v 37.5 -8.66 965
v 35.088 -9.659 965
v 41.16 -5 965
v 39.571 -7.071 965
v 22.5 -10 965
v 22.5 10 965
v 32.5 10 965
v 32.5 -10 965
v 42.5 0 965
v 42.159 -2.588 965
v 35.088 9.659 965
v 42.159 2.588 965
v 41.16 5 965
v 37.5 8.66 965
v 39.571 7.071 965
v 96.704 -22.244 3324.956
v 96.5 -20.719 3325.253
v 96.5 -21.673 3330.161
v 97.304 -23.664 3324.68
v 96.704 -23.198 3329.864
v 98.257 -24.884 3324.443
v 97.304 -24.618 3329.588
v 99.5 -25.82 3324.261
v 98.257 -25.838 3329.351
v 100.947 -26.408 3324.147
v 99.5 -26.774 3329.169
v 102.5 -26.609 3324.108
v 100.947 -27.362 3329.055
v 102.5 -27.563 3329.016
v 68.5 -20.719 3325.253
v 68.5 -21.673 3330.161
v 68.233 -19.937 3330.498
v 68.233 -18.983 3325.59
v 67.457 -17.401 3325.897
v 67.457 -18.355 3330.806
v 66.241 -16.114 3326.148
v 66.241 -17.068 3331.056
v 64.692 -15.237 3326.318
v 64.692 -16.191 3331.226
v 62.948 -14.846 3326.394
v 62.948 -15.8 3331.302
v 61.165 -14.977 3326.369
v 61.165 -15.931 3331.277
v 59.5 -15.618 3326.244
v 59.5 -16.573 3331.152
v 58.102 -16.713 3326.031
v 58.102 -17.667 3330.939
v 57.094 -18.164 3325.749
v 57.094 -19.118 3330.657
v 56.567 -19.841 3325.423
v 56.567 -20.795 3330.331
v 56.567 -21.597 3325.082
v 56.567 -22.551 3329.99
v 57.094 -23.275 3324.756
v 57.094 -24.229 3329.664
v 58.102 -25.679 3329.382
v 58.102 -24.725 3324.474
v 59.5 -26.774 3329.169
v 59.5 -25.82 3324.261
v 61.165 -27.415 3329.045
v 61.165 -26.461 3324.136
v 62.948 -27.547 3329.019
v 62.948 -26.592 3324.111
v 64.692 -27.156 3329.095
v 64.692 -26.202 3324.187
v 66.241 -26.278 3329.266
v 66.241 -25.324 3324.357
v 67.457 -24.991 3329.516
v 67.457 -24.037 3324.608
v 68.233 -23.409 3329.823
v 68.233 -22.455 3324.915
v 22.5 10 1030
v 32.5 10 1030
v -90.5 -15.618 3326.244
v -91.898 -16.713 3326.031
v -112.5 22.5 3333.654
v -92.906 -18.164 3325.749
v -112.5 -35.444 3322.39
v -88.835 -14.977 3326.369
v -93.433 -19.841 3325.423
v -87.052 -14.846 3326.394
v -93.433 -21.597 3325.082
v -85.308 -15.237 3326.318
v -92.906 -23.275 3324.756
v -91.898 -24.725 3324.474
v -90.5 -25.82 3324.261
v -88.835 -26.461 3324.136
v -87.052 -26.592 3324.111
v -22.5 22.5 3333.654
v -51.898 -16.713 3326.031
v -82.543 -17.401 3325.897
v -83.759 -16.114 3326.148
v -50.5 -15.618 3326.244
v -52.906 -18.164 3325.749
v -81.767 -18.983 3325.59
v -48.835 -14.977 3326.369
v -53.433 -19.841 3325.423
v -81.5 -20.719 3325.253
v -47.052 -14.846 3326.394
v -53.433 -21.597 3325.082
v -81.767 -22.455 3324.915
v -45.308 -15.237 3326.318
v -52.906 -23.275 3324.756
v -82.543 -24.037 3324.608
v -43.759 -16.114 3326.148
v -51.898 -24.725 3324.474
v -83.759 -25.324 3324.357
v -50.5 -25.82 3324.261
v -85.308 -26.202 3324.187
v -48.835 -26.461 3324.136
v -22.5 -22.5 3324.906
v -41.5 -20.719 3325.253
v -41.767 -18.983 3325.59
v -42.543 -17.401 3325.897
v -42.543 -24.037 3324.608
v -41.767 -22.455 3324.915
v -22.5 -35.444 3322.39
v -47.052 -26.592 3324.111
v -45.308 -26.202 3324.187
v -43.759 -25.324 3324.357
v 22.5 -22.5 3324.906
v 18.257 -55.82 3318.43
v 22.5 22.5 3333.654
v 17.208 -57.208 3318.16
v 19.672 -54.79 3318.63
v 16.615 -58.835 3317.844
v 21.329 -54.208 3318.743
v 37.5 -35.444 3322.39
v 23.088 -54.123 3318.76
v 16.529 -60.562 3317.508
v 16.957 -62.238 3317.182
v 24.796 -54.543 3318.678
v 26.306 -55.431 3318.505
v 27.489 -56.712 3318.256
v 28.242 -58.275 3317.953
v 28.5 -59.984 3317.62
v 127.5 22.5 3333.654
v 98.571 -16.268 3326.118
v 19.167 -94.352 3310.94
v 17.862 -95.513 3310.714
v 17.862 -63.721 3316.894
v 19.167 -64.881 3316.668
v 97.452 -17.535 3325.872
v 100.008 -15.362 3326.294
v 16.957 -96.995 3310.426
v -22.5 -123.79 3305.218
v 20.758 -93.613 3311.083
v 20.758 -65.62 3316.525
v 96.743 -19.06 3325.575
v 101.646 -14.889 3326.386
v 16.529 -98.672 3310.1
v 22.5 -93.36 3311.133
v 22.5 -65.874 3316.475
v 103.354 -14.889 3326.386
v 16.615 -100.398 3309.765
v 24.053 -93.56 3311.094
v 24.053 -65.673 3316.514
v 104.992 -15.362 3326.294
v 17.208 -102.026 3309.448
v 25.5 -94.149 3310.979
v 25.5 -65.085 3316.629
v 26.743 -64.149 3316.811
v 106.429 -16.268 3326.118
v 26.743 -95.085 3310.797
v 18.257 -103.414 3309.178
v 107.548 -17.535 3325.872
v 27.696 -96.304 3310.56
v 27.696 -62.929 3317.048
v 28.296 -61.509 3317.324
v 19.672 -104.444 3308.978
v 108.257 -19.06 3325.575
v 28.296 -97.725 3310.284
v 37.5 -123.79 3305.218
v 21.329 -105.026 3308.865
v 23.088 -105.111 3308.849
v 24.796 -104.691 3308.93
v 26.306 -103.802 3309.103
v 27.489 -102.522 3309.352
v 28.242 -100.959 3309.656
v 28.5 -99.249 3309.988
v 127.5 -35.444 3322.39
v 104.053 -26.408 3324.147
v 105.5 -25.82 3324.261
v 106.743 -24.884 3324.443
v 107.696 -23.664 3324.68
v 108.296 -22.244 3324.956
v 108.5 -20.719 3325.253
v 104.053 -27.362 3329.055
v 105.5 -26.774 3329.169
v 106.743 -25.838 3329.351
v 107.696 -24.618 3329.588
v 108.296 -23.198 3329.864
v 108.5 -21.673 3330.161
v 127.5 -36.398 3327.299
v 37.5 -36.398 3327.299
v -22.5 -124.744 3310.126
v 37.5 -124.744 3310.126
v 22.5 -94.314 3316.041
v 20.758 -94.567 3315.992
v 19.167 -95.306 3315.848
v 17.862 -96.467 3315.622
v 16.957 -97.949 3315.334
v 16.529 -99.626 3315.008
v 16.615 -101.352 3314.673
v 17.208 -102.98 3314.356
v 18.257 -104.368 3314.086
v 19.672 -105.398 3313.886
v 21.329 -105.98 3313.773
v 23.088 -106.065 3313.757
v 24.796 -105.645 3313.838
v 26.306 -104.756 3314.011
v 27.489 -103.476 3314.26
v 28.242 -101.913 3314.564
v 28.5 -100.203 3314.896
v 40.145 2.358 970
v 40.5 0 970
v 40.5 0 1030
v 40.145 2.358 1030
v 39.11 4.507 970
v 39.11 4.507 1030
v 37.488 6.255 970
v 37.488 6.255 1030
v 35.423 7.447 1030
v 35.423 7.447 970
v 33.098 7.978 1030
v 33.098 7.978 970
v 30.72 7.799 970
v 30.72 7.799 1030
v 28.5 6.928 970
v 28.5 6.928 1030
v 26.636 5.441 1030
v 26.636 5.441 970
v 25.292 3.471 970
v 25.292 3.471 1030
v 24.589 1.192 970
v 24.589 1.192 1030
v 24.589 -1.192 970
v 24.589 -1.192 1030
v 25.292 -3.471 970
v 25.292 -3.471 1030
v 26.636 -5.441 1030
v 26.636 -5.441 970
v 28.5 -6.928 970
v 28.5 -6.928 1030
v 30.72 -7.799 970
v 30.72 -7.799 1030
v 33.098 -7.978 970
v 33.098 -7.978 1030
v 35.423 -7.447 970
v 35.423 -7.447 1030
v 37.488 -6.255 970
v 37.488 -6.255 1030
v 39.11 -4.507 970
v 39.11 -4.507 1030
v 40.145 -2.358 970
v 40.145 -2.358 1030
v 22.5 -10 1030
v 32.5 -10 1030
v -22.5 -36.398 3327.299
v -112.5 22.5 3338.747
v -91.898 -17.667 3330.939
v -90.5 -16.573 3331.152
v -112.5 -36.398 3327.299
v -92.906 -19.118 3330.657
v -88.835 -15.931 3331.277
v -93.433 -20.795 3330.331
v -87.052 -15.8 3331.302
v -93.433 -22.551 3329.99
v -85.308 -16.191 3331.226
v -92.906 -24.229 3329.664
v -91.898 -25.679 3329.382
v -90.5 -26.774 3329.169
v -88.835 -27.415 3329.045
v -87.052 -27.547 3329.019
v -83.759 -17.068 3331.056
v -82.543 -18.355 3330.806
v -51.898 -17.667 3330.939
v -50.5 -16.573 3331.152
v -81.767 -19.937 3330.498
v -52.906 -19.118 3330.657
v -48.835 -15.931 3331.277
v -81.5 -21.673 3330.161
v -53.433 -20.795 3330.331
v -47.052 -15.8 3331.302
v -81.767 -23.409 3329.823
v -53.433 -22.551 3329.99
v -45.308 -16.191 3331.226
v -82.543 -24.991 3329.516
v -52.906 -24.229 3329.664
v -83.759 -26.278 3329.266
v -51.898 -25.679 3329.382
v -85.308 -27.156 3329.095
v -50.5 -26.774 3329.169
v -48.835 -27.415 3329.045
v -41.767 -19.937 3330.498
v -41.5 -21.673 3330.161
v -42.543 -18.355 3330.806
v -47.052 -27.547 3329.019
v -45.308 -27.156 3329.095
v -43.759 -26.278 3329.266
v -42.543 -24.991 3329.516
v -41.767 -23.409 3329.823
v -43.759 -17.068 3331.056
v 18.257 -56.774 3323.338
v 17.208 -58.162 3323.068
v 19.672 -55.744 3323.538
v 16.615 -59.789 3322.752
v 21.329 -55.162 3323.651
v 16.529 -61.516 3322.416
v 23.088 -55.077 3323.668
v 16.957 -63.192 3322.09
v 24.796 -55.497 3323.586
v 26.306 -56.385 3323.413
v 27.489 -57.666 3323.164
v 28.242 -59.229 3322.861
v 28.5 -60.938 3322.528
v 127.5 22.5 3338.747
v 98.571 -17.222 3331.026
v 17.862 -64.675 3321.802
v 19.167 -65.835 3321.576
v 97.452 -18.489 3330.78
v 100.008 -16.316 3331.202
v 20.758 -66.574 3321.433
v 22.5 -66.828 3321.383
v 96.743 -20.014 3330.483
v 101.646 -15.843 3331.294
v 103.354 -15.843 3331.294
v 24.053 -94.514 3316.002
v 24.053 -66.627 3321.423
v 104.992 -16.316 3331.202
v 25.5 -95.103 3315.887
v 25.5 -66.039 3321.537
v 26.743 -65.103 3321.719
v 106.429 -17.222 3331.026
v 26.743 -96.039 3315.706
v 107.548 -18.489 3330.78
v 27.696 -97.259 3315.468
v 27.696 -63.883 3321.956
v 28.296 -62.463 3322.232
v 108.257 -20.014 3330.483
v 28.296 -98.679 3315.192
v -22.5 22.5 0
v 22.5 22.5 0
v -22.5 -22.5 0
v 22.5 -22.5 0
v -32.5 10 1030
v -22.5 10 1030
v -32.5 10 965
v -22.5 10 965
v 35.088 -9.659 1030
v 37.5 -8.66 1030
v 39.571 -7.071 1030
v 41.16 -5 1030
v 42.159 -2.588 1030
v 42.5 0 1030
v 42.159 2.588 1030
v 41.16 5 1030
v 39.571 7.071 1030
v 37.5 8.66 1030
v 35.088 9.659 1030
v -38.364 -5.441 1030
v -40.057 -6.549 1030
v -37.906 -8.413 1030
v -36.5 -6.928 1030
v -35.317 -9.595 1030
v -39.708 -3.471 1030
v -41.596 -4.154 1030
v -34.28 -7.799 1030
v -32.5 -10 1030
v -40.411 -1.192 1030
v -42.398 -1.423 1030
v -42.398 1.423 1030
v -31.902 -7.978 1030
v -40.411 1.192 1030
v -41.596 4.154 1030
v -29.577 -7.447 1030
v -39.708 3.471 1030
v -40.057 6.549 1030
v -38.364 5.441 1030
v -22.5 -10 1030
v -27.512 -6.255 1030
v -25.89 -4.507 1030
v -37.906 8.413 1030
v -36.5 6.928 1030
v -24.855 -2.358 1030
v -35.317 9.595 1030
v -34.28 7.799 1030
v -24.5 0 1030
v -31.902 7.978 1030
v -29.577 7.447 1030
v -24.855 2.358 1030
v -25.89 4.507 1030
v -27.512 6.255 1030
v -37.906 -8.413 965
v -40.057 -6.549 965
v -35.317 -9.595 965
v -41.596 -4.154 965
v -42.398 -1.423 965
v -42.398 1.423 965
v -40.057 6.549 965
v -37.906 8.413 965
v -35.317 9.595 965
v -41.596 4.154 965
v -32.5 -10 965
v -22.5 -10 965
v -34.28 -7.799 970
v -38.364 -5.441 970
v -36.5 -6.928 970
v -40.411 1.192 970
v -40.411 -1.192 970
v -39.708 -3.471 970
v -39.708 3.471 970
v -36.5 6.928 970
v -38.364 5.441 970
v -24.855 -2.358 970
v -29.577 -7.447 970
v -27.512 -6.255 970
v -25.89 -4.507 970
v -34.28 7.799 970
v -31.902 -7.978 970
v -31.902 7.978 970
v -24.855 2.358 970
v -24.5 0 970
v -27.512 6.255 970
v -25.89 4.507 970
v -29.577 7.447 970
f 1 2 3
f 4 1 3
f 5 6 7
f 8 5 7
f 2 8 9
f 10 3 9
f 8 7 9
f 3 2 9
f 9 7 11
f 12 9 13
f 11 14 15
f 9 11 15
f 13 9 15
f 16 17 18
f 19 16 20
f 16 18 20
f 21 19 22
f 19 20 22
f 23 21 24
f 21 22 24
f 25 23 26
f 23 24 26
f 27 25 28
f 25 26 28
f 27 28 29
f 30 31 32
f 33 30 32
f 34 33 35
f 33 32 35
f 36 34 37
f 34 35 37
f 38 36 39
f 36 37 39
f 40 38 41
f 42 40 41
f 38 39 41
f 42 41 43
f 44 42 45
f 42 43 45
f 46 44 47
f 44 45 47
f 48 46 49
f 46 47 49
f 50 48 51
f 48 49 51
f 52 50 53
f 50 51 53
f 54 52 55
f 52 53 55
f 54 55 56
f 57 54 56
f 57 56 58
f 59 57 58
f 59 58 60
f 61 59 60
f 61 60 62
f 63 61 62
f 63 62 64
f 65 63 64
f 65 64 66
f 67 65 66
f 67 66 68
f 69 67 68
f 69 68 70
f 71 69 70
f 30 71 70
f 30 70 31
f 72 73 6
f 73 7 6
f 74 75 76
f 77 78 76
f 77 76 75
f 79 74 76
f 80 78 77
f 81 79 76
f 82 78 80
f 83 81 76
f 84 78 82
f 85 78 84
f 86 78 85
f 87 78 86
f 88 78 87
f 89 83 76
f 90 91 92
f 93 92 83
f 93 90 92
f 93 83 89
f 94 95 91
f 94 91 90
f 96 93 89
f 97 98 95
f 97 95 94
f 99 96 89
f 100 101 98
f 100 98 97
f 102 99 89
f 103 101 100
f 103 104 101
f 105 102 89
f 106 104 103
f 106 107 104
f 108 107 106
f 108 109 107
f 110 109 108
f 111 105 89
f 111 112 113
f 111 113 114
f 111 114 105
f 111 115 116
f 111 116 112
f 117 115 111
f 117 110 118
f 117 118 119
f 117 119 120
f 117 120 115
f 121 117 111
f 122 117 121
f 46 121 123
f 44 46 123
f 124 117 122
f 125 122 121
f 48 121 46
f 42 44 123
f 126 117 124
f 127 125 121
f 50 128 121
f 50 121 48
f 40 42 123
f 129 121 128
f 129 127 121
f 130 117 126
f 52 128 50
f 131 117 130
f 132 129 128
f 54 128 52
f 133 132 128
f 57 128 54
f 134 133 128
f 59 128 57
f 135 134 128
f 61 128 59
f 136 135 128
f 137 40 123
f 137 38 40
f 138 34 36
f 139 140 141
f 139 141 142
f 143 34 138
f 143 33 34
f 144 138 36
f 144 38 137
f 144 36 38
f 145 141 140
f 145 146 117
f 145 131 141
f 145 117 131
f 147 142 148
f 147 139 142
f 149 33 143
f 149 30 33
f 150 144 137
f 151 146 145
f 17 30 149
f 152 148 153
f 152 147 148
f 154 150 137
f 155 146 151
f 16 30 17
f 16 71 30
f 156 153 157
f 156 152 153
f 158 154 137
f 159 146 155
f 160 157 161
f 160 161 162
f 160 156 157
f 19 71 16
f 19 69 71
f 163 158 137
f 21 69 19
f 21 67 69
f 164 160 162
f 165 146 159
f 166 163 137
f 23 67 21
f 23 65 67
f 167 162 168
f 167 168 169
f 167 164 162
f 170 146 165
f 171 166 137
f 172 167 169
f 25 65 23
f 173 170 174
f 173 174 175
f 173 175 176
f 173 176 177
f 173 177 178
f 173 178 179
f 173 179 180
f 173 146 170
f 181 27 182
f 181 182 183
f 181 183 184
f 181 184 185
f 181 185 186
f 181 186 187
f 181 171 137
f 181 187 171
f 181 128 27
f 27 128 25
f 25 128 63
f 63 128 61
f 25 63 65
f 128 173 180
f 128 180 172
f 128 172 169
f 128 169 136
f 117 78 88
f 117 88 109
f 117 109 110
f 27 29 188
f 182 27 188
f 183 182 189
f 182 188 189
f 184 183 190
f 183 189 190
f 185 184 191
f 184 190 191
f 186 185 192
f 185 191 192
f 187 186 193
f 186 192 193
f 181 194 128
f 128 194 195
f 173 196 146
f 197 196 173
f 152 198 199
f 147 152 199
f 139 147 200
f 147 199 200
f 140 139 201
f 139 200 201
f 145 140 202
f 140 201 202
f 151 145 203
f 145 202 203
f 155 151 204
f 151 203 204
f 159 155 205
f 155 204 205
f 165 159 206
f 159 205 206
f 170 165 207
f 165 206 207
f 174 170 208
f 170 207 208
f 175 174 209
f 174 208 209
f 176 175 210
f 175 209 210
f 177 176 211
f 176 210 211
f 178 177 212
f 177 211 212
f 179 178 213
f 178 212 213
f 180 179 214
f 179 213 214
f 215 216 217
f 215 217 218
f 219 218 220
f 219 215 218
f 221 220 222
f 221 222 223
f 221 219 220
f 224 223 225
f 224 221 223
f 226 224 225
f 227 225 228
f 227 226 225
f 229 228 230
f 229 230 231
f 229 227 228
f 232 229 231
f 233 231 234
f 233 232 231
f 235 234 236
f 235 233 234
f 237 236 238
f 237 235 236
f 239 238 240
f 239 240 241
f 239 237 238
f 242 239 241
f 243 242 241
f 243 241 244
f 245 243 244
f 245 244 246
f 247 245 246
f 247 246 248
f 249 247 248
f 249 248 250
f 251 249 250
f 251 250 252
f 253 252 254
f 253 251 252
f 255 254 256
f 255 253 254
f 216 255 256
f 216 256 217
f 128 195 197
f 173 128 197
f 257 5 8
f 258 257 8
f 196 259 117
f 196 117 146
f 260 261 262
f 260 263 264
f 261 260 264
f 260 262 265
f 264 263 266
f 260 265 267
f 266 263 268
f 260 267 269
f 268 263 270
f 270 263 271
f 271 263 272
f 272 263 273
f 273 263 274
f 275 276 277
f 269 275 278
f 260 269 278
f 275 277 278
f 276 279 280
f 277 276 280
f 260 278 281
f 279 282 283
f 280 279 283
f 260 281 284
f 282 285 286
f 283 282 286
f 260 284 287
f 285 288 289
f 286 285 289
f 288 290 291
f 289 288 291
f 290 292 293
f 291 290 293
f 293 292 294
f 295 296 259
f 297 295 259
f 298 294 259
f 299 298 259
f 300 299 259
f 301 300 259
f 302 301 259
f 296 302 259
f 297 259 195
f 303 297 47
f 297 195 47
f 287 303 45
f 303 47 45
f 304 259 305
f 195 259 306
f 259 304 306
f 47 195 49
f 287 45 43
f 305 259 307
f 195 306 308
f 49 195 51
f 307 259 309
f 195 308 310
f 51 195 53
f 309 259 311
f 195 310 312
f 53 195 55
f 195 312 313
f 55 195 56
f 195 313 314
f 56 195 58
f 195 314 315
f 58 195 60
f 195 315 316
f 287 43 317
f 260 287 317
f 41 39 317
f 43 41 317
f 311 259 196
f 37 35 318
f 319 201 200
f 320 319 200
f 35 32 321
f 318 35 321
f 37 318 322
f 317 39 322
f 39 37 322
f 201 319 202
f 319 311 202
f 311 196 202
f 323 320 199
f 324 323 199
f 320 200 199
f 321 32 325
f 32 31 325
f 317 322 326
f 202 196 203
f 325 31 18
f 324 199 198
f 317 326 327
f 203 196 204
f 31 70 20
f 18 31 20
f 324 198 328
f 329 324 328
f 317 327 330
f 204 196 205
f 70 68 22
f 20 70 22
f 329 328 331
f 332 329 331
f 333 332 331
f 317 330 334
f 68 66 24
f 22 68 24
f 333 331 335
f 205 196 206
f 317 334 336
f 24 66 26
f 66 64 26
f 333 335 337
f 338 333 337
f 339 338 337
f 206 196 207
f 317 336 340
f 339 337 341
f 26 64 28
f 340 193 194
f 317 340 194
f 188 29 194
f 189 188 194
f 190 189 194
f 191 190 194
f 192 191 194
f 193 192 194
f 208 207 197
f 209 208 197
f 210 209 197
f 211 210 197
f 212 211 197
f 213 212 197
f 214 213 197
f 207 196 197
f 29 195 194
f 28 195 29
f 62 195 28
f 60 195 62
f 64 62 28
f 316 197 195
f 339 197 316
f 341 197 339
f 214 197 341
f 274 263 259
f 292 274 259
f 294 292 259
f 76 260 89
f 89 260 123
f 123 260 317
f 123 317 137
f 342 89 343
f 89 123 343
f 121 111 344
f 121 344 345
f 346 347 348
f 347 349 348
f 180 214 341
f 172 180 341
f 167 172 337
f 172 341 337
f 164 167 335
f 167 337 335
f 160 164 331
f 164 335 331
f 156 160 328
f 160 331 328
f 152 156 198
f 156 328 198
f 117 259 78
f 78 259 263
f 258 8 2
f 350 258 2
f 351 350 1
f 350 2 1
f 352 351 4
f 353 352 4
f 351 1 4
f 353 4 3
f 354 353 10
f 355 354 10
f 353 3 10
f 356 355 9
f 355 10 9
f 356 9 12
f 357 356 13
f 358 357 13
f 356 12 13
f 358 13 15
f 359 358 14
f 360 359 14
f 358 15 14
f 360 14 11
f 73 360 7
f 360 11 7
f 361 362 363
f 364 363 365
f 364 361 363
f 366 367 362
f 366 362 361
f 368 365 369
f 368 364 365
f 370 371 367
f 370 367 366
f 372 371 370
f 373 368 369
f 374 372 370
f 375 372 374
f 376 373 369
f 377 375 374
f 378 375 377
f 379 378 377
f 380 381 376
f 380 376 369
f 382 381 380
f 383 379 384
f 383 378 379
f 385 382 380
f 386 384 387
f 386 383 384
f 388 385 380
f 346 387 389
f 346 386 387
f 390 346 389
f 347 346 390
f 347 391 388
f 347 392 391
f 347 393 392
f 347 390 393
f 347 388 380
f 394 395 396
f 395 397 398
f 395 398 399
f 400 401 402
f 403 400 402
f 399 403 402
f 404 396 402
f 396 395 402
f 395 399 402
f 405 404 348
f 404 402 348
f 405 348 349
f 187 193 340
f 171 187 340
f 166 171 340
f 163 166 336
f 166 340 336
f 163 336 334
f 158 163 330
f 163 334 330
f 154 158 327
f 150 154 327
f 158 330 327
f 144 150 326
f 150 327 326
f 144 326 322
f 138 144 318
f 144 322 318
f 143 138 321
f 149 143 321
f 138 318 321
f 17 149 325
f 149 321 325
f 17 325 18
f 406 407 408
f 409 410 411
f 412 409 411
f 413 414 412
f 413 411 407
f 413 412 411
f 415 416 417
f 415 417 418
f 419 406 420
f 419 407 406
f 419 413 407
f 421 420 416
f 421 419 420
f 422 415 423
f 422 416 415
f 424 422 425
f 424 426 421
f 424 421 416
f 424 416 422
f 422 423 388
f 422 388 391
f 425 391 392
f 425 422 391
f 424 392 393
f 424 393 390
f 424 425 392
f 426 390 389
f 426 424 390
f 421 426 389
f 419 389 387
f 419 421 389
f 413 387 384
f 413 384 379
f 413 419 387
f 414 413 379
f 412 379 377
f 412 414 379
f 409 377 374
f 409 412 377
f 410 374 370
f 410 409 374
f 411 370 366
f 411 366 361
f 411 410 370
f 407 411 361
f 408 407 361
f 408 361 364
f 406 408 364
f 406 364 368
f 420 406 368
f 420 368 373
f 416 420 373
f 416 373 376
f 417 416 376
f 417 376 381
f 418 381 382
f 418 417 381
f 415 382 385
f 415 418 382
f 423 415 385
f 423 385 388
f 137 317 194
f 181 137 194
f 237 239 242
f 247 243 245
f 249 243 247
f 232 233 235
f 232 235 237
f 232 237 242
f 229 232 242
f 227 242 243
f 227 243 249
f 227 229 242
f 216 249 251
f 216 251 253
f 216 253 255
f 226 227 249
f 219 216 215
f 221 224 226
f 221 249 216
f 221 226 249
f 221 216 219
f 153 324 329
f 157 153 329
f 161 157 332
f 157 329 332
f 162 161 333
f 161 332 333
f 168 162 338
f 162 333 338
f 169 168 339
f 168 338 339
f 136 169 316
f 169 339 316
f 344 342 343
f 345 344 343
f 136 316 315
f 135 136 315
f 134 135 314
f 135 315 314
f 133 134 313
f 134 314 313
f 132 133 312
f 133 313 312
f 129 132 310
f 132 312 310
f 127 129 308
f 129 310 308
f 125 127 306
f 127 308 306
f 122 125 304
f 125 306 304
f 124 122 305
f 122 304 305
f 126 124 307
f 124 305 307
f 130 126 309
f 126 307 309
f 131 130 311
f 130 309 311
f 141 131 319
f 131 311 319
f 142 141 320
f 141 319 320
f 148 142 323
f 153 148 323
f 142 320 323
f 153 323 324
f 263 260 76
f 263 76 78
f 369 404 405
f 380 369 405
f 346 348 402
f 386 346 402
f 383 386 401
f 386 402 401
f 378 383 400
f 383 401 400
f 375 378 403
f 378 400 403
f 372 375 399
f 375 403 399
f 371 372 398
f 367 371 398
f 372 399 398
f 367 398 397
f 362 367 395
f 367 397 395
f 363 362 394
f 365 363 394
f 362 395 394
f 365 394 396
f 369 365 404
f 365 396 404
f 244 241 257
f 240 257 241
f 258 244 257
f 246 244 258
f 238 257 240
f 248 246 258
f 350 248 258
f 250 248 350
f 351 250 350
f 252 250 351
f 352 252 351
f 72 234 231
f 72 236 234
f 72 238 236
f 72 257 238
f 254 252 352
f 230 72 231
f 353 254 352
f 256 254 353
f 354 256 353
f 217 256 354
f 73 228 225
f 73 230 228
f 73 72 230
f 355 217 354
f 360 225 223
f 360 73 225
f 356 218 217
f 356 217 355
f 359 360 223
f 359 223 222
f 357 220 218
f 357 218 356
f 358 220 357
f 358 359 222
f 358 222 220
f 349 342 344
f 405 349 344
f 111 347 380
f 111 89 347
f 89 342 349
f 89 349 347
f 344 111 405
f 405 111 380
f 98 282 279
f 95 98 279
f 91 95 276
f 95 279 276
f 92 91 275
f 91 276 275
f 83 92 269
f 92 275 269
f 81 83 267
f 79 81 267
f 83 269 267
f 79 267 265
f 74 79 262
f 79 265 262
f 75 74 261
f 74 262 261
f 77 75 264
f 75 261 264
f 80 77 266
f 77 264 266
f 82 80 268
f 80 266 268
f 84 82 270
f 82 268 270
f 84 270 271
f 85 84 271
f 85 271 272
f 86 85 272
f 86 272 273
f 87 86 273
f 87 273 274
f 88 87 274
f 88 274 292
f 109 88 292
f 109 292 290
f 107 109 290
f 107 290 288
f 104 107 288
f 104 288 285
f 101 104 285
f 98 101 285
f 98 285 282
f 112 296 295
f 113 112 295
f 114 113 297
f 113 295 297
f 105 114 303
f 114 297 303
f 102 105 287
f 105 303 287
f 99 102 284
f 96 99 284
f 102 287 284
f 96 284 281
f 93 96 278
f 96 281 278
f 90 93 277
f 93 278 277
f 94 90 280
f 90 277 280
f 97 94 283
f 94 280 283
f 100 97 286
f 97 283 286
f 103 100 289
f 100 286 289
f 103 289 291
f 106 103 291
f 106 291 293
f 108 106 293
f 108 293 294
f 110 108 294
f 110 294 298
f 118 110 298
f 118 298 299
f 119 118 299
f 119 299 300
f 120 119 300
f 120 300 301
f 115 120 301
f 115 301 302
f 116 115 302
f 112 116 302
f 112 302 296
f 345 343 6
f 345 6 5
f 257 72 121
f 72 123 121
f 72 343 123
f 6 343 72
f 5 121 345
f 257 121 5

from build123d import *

# Parameters (mm, degrees)
F0_W      = 45
F0_H      = 45
F1_DEPTH  = 3330
F4_DEPTH  = 5
F5_R      = 8
F6_DEPTH  = 60
F9_W      = 45
F9_H      = 45.842251273
F10_DEPTH = 25
F11_W     = 60
F11_H     = 60
F11_W_2   = 90
F11_H_2   = 90
F12_DEPTH = 5
F13_R     = 6
F14_DEPTH = 25
F15_W     = 150
F15_H     = 4.7702248844
F16_DEPTH = 3358.6871623993
F18_DEPTH = 111


with BuildPart() as f1:
    # F0 (on Top) → F1 (new body)
    with BuildSketch(Plane.XY):
        Rectangle(F0_W, F0_H)
    extrude(amount=F1_DEPTH)

    # F3 (on offset) → F4 (join)
    with BuildSketch(Plane.XY.offset(965)):
        with BuildLine():
            Line((-22.5, 0), (0, 0))
            Line((0, 0), (22.5, 0))
            ThreePointArc((22.5, 0), (22.5506384699, 1.0050896201), (22.7020410289, 2))
            ThreePointArc((22.7020410289, 2), (26.1754446797, 7.7459666924), (32.5, 10))
            Line((32.5, 10), (-32.5, 10))
            ThreePointArc((-32.5, 10), (-25.4289321881, 7.0710678119), (-22.5, 0))
        make_face()
        with BuildLine():
            Line((22.5, 0), (0, 0))
            Line((0, 0), (-22.5, 0))
            ThreePointArc((-22.5, 0), (-25.4289321881, -7.0710678119), (-32.5, -10))
            Line((-32.5, -10), (32.5, -10))
            ThreePointArc((32.5, -10), (26.1754446797, -7.7459666924), (22.7020410289, -2))
            ThreePointArc((22.7020410289, -2), (22.5506384699, -1.0050896201), (22.5, 0))
        make_face()
        with BuildLine():
            ThreePointArc((-32.5, -10), (-25.4289321881, -7.0710678119), (-22.5, 0))
            Line((-22.5, 0), (-32.5, 0))
            Line((-32.5, 0), (-32.5, -10))
        make_face()
        with BuildLine():
            Line((-32.5, 0), (-22.5, 0))
            ThreePointArc((-22.5, 0), (-25.4289321881, 7.0710678119), (-32.5, 10))
            Line((-32.5, 10), (-32.5, 0))
        make_face()
        with BuildLine():
            Line((32.5, 2), (32.5, 0))
            Line((32.5, 0), (32.5, -2))
            Line((32.5, -2), (22.7020410289, -2))
            ThreePointArc((22.7020410289, -2), (26.1754446797, -7.7459666924), (32.5, -10))
            ThreePointArc((32.5, -10), (39.5710678119, -7.0710678119), (42.5, 0))
            ThreePointArc((42.5, 0), (39.5710678119, 7.0710678119), (32.5, 10))
            Line((32.5, 10), (32.5, 2))
        make_face()
        with BuildLine():
            ThreePointArc((32.5, 10), (26.1754446797, 7.7459666924), (22.7020410289, 2))
            Line((22.7020410289, 2), (32.5, 2))
            Line((32.5, 2), (32.5, 10))
        make_face()
        with BuildLine():
            Line((-32.5, -10), (-32.5, 0))
            Line((-32.5, 0), (-32.5, 10))
            ThreePointArc((-32.5, 10), (-42.5, 0), (-32.5, -10))
        make_face()
        with BuildLine():
            ThreePointArc((22.7020410289, 2), (22.5506384699, 1.0050896201), (22.5, 0))
            Line((22.5, 0), (32.5, 0))
            Line((32.5, 0), (32.5, 2))
            Line((32.5, 2), (22.7020410289, 2))
        make_face()
        with BuildLine():
            Line((32.5, 0), (22.5, 0))
            ThreePointArc((22.5, 0), (22.5506384699, -1.0050896201), (22.7020410289, -2))
            Line((22.7020410289, -2), (32.5, -2))
            Line((32.5, -2), (32.5, 0))
        make_face()
    extrude(amount=F4_DEPTH)

    # F5 (on face) → F6 (join)
    with BuildSketch(Plane.XY.offset(970)):
        with BuildLine():
            ThreePointArc((32.5, -10), (39.5710678119, -7.0710678119), (42.5, 0))
            ThreePointArc((42.5, 0), (39.5710678119, 7.0710678119), (32.5, 10))
            ThreePointArc((32.5, 10), (25.4289321881, 7.0710678119), (22.5, 0))
            ThreePointArc((22.5, 0), (25.4289321881, -7.0710678119), (32.5, -10))
        make_face()
        with Locations((32.5, 0)):
            Circle(F5_R, mode=Mode.SUBTRACT)
        with BuildLine():
            ThreePointArc((-32.5, -10), (-25.4289321881, -7.0710678119), (-22.5, 0))
            ThreePointArc((-22.5, 0), (-25.4289321881, 7.0710678119), (-32.5, 10))
            ThreePointArc((-32.5, 10), (-42.5, 0), (-32.5, -10))
        make_face()
        with Locations((-32.5, 0)):
            Circle(F5_R, mode=Mode.SUBTRACT)
        with BuildLine():
            Line((22.5, -10), (32.5, -10))
            ThreePointArc((32.5, -10), (25.4289321881, -7.0710678119), (22.5, 0))
            Line((22.5, 0), (22.5, -10))
        make_face()
        with BuildLine():
            ThreePointArc((22.5, 0), (25.4289321881, 7.0710678119), (32.5, 10))
            Line((32.5, 10), (22.5, 10))
            Line((22.5, 10), (22.5, 0))
        make_face()
        with BuildLine():
            ThreePointArc((-32.5, 10), (-25.4289321881, 7.0710678119), (-22.5, 0))
            Line((-22.5, 0), (-22.5, 10))
            Line((-22.5, 10), (-32.5, 10))
        make_face()
        with BuildLine():
            Line((-22.5, -10), (-22.5, 0))
            ThreePointArc((-22.5, 0), (-25.4289321881, -7.0710678119), (-32.5, -10))
            Line((-32.5, -10), (-22.5, -10))
        make_face()
    extrude(amount=F6_DEPTH)

    # F9 (on face) → F10 (join)
    with BuildSketch(Plane(origin=(0, -624.5391596736, 3212.9754420296), x_dir=(1, 0, 0), z_dir=(0, 0.1908089954, -0.9816271834))):
        with Locations((0, -636.2284686128)):
            Rectangle(F9_W, F9_H)
    extrude(amount=F10_DEPTH)

    # F11 (on face) → F12 (join)
    with BuildSketch(Plane(origin=(0, -624.5391596736, 3212.9754420296), x_dir=(1, 0, 0), z_dir=(0, 0.1908089954, -0.9816271834))):
        with Locations((7.5, -629.1495942493)):
            Rectangle(F11_W, F11_H)
        with Locations((-67.5, -629.1495942493)):
            Rectangle(F11_W_2, F11_H)
        with Locations((82.5, -629.1495942493)):
            Rectangle(F11_W_2, F11_H)
        with Locations((7.5, -554.1495942493)):
            Rectangle(F11_W, F11_H_2)
    extrude(amount=F12_DEPTH)

    # F13 (on face) → F14 (cut)
    with BuildSketch(Plane(origin=(0, -624.5391596736, 3212.9754420296), x_dir=(1, 0, 0), z_dir=(0, -0.1908089954, 0.9816271834))):
        with BuildLine():
            ThreePointArc((22.5, 540.1495942493), (18.2573593129, 529.9069535622), (28.5, 534.1495942493))
            Line((28.5, 534.1495942493), (22.5, 534.1495942493))
            Line((22.5, 534.1495942493), (22.5, 540.1495942493))
        make_face()
        with BuildLine():
            Line((22.5, 534.1495942493), (28.5, 534.1495942493))
            ThreePointArc((28.5, 534.1495942493), (26.7426406871, 538.3922349364), (22.5, 540.1495942493))
            Line((22.5, 540.1495942493), (22.5, 534.1495942493))
        make_face()
        with BuildLine():
            ThreePointArc((28.5, 574.1495942493), (18.2573593129, 578.3922349364), (22.5, 568.1495942493))
            ThreePointArc((22.5, 568.1495942493), (26.7426406871, 569.9069535622), (28.5, 574.1495942493))
        make_face()
        with BuildLine():
            ThreePointArc((96.5, 614.1495942493), (98.2573593129, 609.9069535622), (102.5, 608.1495942493))
            Line((102.5, 608.1495942493), (102.5, 614.1495942493))
            Line((102.5, 614.1495942493), (96.5, 614.1495942493))
        make_face()
        with Locations((62.5, 614.1495942493)):
            Circle(F13_R)
        with BuildLine():
            Line((102.5, 614.1495942493), (102.5, 608.1495942493))
            ThreePointArc((102.5, 608.1495942493), (106.7426406871, 609.9069535622), (108.5, 614.1495942493))
            ThreePointArc((108.5, 614.1495942493), (102.5, 620.1495942493), (96.5, 614.1495942493))
            Line((96.5, 614.1495942493), (102.5, 614.1495942493))
        make_face()
        with Locations((-47.5, 614.1495942493)):
            Circle(F13_R)
        with Locations((-87.5, 614.1495942493)):
            Circle(F13_R)
    extrude(amount=-F14_DEPTH, mode=Mode.SUBTRACT)

    # F15 (on Top) → F16 (cut)
    with BuildSketch(Plane.XY):
        with Locations((52.5, 24.8851124422)):
            Rectangle(F15_W, F15_H)
    extrude(amount=F16_DEPTH, mode=Mode.SUBTRACT)

    # F17 (on face) → F18 (cut)
    with BuildSketch(Plane.YZ.offset(-22.5)):
        Polygon((22.5, 3333.6535304364), (23.4540449769, 3333.838977994), (22.5, 3338.7471139112), align=None)
    extrude(amount=-F18_DEPTH, mode=Mode.SUBTRACT)


solid = f1.part
